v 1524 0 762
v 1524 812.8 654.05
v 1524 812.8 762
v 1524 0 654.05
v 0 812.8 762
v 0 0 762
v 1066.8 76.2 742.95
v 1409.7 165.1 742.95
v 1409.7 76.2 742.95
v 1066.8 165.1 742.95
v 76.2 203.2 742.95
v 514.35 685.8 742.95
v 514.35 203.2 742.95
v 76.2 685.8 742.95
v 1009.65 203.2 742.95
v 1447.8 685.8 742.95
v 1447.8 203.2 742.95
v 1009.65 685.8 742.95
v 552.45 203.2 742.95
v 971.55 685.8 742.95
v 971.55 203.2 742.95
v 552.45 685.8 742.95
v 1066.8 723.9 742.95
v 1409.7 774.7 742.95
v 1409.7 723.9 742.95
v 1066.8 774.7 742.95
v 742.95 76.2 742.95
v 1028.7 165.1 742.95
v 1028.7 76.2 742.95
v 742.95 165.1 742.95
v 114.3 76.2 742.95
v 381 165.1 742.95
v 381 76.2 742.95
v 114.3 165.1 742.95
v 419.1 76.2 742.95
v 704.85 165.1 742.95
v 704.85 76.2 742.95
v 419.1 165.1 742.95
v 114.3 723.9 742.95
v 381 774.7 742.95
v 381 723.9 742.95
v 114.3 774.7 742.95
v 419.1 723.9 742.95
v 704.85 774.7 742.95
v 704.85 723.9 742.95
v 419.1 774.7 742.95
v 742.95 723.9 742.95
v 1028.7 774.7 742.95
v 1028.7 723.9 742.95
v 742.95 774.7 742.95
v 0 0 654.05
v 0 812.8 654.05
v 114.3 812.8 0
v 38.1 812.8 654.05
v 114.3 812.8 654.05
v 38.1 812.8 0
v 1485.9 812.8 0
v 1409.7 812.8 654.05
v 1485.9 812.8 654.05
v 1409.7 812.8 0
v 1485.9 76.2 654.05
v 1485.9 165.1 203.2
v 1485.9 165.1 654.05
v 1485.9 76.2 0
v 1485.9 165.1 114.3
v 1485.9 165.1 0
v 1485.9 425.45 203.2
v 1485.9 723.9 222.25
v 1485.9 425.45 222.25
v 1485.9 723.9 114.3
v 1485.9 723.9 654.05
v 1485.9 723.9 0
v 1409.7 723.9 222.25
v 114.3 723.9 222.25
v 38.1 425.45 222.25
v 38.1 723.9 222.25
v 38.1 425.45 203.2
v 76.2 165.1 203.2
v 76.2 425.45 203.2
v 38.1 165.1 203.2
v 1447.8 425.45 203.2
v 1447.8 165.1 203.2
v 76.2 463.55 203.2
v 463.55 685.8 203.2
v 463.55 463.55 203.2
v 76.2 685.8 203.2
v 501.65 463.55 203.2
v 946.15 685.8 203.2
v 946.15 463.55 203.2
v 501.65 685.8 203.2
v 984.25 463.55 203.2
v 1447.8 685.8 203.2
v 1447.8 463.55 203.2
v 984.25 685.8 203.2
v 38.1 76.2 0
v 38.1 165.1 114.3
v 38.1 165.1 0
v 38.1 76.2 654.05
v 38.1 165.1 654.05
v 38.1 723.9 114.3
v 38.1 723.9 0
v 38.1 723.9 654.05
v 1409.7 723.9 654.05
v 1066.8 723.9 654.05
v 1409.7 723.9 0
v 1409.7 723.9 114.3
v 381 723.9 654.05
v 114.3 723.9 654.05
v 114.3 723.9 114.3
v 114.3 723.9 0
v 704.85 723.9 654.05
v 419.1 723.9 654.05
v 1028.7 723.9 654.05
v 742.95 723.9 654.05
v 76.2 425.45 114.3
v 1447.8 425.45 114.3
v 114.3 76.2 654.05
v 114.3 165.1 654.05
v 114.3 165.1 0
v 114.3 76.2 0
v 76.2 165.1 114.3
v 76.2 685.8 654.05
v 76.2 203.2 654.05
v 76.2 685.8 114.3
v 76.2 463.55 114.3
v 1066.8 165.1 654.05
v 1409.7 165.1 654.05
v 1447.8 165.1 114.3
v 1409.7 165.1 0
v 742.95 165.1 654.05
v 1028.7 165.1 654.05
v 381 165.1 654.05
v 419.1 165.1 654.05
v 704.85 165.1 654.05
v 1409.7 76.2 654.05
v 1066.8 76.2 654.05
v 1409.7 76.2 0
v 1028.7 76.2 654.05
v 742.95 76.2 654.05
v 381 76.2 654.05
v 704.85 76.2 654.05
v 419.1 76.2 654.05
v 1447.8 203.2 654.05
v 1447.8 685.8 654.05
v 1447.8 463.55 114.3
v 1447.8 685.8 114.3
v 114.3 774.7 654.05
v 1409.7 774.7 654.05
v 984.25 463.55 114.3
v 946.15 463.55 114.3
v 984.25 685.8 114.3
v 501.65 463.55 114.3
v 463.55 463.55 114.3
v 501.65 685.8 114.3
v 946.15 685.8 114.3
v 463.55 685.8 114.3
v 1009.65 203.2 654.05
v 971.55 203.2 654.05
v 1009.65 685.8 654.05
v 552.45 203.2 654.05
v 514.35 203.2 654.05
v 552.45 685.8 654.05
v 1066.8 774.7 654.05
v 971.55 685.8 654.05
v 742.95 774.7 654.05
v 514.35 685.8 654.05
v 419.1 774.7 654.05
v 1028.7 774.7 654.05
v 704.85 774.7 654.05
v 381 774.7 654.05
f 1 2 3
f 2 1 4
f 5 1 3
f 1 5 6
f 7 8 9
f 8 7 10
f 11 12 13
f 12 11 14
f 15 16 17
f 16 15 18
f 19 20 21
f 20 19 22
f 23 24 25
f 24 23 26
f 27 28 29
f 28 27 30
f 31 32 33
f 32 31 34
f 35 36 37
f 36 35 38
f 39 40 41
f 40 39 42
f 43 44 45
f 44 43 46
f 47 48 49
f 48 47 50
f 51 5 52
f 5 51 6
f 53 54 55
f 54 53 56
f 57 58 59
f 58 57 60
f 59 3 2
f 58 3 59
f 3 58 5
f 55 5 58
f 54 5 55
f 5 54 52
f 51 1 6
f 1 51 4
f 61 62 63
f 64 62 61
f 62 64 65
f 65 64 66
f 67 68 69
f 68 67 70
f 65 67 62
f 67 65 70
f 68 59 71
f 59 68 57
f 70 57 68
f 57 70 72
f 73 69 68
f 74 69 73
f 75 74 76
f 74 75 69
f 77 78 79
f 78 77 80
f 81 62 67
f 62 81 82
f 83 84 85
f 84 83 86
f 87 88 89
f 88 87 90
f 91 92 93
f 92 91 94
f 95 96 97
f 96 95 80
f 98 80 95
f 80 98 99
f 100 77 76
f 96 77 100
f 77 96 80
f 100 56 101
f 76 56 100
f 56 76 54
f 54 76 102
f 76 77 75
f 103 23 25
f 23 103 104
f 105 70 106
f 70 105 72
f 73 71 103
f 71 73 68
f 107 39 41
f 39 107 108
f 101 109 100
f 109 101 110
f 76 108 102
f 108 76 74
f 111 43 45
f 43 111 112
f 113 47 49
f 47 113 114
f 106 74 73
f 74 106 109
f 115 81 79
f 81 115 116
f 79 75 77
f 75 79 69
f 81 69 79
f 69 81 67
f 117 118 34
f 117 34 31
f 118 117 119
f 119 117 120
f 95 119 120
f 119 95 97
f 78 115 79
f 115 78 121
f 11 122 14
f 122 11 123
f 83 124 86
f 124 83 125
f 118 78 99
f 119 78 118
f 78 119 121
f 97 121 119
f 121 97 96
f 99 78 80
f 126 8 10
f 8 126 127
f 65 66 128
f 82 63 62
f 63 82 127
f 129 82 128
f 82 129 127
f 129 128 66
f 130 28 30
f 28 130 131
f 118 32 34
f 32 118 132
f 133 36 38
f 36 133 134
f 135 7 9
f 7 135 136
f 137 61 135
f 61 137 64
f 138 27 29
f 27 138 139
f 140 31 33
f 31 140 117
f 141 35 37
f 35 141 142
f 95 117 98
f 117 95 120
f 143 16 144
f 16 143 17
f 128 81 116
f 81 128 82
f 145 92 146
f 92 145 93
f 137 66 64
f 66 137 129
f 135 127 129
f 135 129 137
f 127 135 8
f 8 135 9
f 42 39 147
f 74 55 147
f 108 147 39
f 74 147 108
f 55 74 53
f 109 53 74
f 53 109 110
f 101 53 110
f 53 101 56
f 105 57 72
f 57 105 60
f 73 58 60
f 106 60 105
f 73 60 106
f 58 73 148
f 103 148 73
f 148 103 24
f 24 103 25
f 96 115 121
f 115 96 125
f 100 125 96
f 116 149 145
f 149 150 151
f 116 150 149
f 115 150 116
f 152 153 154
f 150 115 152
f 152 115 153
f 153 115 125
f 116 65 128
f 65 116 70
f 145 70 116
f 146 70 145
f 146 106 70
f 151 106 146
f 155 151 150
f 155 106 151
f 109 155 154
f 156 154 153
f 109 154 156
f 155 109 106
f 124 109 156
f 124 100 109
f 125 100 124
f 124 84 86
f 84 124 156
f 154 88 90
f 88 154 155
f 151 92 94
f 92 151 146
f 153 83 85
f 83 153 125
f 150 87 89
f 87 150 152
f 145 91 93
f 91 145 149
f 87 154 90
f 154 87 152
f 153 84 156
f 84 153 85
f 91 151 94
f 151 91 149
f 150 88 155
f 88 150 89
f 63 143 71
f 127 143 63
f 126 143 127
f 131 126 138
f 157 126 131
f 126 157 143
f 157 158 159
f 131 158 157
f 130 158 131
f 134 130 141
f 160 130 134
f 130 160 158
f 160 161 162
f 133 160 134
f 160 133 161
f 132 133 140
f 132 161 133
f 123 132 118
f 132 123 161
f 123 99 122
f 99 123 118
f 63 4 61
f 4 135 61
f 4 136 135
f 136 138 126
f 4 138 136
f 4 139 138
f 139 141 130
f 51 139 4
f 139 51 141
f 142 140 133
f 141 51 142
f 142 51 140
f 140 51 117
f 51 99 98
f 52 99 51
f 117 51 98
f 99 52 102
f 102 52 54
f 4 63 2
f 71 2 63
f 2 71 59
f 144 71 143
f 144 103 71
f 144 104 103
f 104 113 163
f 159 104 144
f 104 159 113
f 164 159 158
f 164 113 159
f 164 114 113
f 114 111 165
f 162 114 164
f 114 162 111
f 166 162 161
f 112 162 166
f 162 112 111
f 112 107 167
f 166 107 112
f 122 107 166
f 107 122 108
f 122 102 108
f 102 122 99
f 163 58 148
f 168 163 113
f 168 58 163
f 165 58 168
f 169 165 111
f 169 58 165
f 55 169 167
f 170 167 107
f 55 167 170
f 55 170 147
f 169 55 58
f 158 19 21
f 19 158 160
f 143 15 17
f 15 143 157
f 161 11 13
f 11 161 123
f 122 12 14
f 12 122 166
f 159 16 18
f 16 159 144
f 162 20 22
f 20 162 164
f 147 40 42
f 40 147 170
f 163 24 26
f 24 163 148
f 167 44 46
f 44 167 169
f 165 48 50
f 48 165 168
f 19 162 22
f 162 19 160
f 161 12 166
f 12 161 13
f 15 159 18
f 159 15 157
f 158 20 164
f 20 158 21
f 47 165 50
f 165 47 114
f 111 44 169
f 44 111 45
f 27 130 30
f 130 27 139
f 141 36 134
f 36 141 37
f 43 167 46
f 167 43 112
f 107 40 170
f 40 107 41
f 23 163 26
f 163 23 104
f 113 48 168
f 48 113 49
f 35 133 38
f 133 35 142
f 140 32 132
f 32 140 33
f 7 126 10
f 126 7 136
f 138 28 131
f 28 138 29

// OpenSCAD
// inches or mm?
units=1;			// [1:inches,0:mm]

benchWidth=60;

benchHeight=30;

benchDepth=32;

braceHeight=8;
// 0 = no top
topThickness=0.75;


// this is an openScad parametric version of Thingiverse item 1456181 by JenniferG

// stud orientation
hx=1*1;	// horizontal x
hy=2*1;	// horizontal y
v=3*1;	// vertical

module stud(length=72,orient=v) {
	echo(length = length);
	if (orient==hy) {
		cube([1.5,length,3.5]);
	} else if (orient==hx) {
		cube([length,1.5,3.5]);
	} else {
		cube([1.5,3.5,length]);
	}		
}

module bench(length=72,width=24,height=32,braceHeight=8,topThickness=0.75) {
	// legs
	translate([3,3,0]) stud(height-topThickness);
	translate([3+length-6-1.5,3,0]) stud(height-topThickness);
	translate([3,3+width-3.5-3,0]) stud(height-topThickness);
	translate([3+length-6-1.5,3+width-3.5-3,0]) stud(height-topThickness);
	// leg doublers - left
	translate([1.5,3,braceHeight]) stud(height-braceHeight-3.5);	
	translate([1.5,3,0]) stud(braceHeight-3.5);
	translate([1.5,3+width-3.5-3,braceHeight]) stud(height-braceHeight-3.5);
	translate([1.5,3+width-3.5-3,0]) stud(braceHeight-3.5);
	// leg doublers - right
	translate([3+length-6,3,braceHeight]) stud(height-braceHeight-3.5);
	translate([3+length-6,3,0]) stud(braceHeight-3.5);
	translate([3+length-6,3+width-3.5-3,braceHeight]) stud(height-braceHeight-3.5);
	translate([3+length-6,3+width-3.5-3,0]) stud(braceHeight-3.5);
	// leg braces
	translate([1.5,3,braceHeight-3.5]) stud(width-3, orient=hy);
	translate([3+length-6,3,braceHeight-3.5]) stud(width-3, orient=hy);

	// lower brace
	translate([1.5,width-5,braceHeight-3.5]) stud(length-3, orient=hx);
	translate([1.5,3+(width-3)/2-0.75,braceHeight-3.5]) stud(length-3, orient=hx);
	// lower brace fillers
	translate([(length-3)/3-0.75,3+(width-3)/2+0.75,braceHeight-3.5]) stud(width-5-3-(width-3)/2-0.75, orient=hy);
	translate([(length-3)*2/3-0.75,3+(width-3)/2+0.75,braceHeight-3.5]) stud(width-5-3-(width-3)/2-0.75, orient=hy);

	// horizontals
	translate([1.5,1.5,height-topThickness-3.5]) stud(length-3, orient=hx);
	translate([0,0,height-topThickness-3.5]) stud(length, orient=hx);
	translate([3,1.5+3.5+1.5,height-topThickness-3.5]) stud(length-6, orient=hx);
	translate([3,3+width-3.5-3-1.5,height-topThickness-3.5]) stud(length-6, orient=hx);
	translate([4.5,3+width-3.5-3-1.5+3.5,height-topThickness-3.5]) stud(length-9, orient=hx);
	
	// front-to-backs
	translate([0,1.5,height-topThickness-3.5]) stud(width-1.5, orient=hy);
	translate([1.5,3,height-topThickness-3.5]) stud(width-3, orient=hy);
	translate([length-1.5,1.5,height-topThickness-3.5]) stud(width-1.5, orient=hy);
	translate([length-3,3,height-topThickness-3.5]) stud(width-3, orient=hy);
	
	// fillers
	translate([(length-6)/3-0.75+3,8,height-topThickness-3.5]) stud(width-13, orient=hy);
	translate([(length-6)*2/3-0.75+3,8,height-topThickness-3.5]) stud(width-13, orient=hy);
	translate([(length-9)*2/4-0.75+3,width-3.5,height-topThickness-3.5]) stud(2, orient=hy);
	translate([(length-9)*2/4-0.75+3,3,height-topThickness-3.5]) stud(3.5, orient=hy);

	// these fillers are probably overkill - leaving them in since original design by JenniferG had them
	translate([(length-9)*1/4-0.75+3,width-3.5,height-topThickness-3.5]) stud(2, orient=hy);
	translate([(length-9)*3/4-0.75+3,width-3.5,height-topThickness-3.5]) stud(2, orient=hy);		
	translate([(length-9)*1/4-0.75+3,3,height-topThickness-3.5]) stud(3.5, orient=hy);
	translate([(length-9)*3/4-0.75+3,3,height-topThickness-3.5]) stud(3.5, orient=hy);	
	
	// and finally...the top sheet
	if (topThickness > 0) {
		translate([0,0,height-topThickness]) cube([length,width,topThickness]);
		// and even a lower shelf while we're at it
		translate([1.5,3+(width-3)/2-0.75,braceHeight]) cube([length-3,(width-3)/2+0.75-3.5,topThickness]);
		// if I were making this in real life, I'd have fit the lower shelf around the back legs...but I'm too lazy right now	
	}
}

//scaleFactor = (units == "inches")?25.4:1;
scaleFactor = units*24.4+1;

scale(scaleFactor) {
	bench(benchWidth,benchDepth,benchHeight,braceHeight,topThickness);
}
